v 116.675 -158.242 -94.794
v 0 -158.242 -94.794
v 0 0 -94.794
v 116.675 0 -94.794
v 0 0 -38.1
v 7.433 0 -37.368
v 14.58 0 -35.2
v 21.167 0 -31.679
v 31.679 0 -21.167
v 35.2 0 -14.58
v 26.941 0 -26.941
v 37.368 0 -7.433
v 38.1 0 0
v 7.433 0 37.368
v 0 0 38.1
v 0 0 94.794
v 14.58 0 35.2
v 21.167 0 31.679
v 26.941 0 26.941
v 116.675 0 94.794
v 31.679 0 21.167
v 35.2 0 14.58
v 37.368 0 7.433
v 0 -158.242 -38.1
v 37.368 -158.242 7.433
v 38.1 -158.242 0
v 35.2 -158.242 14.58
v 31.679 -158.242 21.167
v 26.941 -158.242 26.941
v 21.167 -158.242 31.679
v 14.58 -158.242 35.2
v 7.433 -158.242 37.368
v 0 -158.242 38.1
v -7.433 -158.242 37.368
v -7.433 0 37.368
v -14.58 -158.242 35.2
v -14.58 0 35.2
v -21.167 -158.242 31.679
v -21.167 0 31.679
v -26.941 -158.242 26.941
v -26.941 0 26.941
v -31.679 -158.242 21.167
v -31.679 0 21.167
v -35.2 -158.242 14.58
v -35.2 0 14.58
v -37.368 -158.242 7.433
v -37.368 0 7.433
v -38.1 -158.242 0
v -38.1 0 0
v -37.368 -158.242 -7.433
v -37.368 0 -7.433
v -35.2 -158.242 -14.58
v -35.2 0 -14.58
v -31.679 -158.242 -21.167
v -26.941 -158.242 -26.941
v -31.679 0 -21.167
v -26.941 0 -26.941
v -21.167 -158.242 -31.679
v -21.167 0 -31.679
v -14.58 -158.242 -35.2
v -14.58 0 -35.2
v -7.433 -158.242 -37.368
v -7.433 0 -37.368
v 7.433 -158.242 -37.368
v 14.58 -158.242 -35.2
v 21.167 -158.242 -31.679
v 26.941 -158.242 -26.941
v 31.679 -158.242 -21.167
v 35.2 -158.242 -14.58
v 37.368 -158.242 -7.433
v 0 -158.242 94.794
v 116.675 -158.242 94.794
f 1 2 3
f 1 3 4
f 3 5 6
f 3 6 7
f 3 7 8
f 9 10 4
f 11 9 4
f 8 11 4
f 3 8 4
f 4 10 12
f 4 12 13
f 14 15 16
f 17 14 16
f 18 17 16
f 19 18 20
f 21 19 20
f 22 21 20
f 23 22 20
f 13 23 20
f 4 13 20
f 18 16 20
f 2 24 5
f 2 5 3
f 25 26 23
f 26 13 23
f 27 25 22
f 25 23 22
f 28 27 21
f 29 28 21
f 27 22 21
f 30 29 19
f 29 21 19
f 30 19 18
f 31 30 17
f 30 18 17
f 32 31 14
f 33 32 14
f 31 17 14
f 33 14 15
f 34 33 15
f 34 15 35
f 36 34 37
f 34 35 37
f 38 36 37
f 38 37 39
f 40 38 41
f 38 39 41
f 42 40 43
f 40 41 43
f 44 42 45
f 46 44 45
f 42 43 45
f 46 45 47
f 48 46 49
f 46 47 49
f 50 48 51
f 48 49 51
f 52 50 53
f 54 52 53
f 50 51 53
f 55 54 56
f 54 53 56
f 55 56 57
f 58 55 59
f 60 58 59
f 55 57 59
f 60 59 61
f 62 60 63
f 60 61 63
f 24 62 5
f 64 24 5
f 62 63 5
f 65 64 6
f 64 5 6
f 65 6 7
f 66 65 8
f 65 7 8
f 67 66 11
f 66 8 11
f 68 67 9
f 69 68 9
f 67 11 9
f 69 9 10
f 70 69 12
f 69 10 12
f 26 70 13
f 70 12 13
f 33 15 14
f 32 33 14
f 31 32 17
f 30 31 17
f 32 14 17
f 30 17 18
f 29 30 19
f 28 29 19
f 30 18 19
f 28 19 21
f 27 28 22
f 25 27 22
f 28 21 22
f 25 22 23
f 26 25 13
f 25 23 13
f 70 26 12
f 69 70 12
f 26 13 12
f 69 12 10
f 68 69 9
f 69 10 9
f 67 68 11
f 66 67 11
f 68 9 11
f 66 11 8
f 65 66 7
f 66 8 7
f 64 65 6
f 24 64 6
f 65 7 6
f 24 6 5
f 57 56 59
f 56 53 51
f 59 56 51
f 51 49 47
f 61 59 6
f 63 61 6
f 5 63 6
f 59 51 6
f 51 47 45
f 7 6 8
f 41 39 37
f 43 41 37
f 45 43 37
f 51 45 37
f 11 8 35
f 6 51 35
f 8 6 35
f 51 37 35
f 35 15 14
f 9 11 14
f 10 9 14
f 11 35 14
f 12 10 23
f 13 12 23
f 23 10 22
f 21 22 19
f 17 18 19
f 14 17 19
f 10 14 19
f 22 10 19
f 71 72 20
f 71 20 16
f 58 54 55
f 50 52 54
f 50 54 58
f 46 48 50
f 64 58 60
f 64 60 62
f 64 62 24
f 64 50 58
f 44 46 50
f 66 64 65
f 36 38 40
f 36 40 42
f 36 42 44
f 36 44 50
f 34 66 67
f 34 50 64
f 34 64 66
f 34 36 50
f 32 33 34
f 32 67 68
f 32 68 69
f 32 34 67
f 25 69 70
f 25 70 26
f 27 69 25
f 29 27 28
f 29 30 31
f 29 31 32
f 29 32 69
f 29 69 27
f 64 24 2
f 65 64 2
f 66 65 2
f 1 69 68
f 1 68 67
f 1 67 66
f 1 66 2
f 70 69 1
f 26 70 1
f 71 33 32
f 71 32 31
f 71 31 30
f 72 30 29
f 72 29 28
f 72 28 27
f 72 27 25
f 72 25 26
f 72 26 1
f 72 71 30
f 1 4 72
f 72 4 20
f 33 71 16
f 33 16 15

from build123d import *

# Parameters (mm, degrees)
F0_R     = 38.1
F1_DEPTH = 25.4
F3_DEPTH = 158.242
F4_DEPTH = 132.842


with BuildPart() as f1:
    # F0 (on Front) → F1 (new body)
    with BuildSketch(Plane.XZ):
        Circle(F0_R)
    extrude(amount=F1_DEPTH)

    # F4 (add, through all): a face of the model
    f4_faces = [f1.faces().sort_by_distance(p)[0] for p in [
        (0, -25.4, 0),
    ]]
    extrude(f4_faces, amount=F4_DEPTH)


with BuildPart() as f3:
    # F2 (on Front) → F3 (new body)
    with BuildSketch(Plane.XZ):
        with BuildLine():
            ThreePointArc((0, 38.1), (38.1, 0), (0, -38.1))
            Line((0, -38.1), (0, -94.7943329811))
            Line((0, -94.7943329811), (116.6753321886, -94.7943329811))
            Line((116.6753321886, -94.7943329811), (116.6753321886, 0))
            Line((116.6753321886, 0), (116.6753321886, 94.7943329811))
            Line((116.6753321886, 94.7943329811), (0, 94.7943329811))
            Line((0, 94.7943329811), (0, 38.1))
        make_face()
    extrude(amount=F3_DEPTH)


solid = Compound([f1.part, f3.part])
